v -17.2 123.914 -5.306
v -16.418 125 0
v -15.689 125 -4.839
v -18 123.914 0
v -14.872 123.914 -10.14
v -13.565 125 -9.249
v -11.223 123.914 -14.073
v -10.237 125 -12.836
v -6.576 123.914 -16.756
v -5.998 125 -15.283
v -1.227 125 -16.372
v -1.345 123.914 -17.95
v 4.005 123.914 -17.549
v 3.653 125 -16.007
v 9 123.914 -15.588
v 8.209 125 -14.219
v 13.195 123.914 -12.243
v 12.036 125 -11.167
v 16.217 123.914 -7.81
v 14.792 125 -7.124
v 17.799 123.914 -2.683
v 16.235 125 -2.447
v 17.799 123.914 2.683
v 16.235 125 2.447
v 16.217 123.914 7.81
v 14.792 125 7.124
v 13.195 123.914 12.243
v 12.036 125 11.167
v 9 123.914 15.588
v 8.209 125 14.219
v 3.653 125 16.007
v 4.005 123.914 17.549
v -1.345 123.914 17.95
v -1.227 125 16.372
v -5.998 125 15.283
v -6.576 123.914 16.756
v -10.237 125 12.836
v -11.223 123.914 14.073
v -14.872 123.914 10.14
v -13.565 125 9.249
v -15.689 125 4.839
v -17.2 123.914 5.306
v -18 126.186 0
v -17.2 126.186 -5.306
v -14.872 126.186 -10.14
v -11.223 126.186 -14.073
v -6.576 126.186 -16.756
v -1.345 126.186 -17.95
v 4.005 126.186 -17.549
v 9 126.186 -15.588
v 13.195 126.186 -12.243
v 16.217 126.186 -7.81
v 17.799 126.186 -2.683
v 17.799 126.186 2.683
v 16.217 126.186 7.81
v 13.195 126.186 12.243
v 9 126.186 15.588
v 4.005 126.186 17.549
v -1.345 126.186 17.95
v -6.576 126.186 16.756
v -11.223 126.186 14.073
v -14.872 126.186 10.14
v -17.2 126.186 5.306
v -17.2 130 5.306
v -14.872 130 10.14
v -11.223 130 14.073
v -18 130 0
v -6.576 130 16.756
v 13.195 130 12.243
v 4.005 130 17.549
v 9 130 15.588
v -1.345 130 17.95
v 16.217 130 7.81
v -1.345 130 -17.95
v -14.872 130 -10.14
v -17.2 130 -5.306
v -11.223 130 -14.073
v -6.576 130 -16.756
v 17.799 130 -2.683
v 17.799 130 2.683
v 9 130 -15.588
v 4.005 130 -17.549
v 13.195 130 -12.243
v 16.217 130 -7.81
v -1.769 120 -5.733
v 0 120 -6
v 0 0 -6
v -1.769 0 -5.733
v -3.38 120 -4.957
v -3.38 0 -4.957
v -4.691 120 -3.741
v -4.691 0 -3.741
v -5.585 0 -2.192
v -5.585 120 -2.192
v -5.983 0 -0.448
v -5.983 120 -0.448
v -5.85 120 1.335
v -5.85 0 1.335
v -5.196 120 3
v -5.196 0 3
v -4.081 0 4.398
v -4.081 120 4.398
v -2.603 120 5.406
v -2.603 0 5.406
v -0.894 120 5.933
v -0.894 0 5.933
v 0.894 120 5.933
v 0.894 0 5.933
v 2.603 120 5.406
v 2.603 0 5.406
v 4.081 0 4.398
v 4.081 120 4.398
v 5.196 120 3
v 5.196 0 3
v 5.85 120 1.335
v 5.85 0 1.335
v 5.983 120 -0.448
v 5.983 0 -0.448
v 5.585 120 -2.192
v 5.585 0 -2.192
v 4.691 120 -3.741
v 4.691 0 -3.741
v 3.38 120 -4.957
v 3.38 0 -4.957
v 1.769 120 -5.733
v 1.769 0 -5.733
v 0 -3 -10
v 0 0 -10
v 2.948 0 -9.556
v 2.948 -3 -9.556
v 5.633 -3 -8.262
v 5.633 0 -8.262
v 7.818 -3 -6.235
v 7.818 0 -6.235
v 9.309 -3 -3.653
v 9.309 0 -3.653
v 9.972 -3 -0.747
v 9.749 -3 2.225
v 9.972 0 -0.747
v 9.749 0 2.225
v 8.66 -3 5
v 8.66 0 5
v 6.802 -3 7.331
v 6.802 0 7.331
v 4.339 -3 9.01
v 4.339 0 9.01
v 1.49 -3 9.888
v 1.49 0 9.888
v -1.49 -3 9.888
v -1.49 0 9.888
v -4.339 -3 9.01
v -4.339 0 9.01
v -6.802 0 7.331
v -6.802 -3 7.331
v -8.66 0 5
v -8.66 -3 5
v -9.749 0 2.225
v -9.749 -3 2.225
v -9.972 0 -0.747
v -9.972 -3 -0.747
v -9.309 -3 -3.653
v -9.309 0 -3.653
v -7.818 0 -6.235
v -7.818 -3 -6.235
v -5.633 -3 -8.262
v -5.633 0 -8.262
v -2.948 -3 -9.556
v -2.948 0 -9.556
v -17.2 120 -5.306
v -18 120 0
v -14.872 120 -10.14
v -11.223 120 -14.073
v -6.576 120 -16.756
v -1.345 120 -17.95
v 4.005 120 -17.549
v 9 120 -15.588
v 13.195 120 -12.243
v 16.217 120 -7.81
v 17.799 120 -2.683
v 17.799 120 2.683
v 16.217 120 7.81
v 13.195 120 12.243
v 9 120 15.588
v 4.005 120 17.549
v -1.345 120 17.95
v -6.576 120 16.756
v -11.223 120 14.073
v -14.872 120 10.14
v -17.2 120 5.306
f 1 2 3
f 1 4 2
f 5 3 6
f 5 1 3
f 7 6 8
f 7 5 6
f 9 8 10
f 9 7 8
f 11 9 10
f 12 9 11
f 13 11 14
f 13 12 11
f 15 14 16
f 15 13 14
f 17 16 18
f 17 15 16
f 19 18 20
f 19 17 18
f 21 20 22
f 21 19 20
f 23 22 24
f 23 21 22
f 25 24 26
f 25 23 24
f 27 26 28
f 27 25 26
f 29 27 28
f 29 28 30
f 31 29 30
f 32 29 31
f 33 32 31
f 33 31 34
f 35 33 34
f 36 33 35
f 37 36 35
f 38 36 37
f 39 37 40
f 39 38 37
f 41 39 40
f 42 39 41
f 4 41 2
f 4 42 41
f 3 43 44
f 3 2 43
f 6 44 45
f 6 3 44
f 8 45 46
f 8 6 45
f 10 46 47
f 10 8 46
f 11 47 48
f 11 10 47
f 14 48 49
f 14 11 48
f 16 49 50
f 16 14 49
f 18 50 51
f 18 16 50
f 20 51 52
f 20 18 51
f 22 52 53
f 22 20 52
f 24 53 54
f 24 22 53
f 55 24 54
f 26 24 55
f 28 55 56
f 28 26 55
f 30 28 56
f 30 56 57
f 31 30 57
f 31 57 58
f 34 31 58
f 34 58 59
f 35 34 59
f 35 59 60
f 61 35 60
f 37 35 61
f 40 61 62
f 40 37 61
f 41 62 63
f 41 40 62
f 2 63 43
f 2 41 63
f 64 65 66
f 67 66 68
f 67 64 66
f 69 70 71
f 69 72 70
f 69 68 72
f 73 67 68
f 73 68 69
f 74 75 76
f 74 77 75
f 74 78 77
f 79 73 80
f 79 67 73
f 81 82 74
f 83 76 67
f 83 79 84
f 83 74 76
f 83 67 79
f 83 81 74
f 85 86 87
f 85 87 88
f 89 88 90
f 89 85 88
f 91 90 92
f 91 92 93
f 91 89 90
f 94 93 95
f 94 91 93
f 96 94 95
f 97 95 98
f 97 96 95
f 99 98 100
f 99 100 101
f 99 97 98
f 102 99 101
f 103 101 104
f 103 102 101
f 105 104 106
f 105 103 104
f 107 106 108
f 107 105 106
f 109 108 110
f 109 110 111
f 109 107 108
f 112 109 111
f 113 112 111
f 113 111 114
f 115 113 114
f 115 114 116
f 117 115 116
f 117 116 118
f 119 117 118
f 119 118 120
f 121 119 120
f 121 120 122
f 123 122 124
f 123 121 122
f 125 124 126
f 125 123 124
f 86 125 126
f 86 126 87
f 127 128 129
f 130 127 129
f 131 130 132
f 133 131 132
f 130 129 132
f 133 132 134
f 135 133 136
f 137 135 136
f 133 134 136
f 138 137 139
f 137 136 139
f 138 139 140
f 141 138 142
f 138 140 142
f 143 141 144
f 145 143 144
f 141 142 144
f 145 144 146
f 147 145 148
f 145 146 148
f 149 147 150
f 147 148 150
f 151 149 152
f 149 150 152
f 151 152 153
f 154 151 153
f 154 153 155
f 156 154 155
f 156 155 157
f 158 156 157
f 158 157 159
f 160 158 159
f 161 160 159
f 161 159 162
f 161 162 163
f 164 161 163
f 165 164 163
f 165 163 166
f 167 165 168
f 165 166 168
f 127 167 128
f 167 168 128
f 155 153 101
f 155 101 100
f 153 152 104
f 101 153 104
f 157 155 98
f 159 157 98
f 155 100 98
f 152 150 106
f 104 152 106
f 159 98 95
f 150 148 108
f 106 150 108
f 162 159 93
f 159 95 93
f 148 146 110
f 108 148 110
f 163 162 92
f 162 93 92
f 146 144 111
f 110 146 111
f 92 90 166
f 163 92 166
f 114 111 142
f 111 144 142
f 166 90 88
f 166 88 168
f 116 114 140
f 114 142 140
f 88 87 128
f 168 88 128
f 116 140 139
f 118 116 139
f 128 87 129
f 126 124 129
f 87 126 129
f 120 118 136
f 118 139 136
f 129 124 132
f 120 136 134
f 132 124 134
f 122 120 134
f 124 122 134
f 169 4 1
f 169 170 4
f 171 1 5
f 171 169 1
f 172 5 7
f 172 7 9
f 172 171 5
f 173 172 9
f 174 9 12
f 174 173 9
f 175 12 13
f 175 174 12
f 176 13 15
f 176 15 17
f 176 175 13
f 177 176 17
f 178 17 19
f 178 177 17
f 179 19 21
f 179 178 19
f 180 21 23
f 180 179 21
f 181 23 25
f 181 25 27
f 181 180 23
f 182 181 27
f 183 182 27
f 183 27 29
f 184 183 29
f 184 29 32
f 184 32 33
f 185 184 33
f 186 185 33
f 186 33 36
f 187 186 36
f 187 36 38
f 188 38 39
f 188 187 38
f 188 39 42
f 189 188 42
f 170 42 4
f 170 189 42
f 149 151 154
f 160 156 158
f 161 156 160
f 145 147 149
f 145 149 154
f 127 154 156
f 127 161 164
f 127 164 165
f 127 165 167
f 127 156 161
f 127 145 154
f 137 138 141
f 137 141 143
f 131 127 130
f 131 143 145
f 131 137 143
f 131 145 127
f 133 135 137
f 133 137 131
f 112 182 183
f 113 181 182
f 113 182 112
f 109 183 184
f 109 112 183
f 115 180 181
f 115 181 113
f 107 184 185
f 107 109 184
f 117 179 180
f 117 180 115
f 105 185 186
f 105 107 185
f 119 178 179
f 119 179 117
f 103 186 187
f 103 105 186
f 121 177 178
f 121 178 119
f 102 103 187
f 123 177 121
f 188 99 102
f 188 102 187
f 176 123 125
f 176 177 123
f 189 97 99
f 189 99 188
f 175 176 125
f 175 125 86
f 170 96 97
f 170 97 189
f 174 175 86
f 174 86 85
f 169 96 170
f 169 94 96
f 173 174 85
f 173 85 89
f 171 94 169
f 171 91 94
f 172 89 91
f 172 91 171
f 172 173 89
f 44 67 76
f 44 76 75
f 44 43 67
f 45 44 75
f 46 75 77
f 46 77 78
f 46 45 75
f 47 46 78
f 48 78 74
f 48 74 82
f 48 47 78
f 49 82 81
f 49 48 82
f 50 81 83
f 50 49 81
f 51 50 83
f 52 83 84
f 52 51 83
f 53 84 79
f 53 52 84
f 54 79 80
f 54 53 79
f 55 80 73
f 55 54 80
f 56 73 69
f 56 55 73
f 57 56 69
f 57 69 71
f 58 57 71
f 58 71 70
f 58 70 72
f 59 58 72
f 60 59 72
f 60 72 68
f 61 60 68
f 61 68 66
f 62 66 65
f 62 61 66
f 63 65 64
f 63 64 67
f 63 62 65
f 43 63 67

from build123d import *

# Parameters (mm, degrees)
SKETCH3_R           = 10
BOSS_EXTRUDE1_DEPTH = 3


with BuildPart() as part:
    # Sketch1 → Revolve1 (revolve)
    with BuildSketch(Plane.XY, mode=Mode.PRIVATE) as revolve1_sk:
        Polygon((0, 0), (0, 130), (6, 130), (6, 122.525384953), (6, 0), align=None)
    revolve(revolve1_sk.sketch.rotate(Axis((0, 0, 0), (0, 1, 0)), 90), axis=Axis((0, 0, 0), (0, 1, 0)))

    # Sketch2 → Revolve2 (revolve)
    with BuildSketch(Plane.XY, mode=Mode.PRIVATE) as revolve2_sk:
        Polygon((0, 130), (18, 130), (18, 126.185810056), (16.418354863, 125), (18, 123.913651393), (18, 120), (0, 120), align=None)
    revolve(revolve2_sk.sketch.rotate(Axis((0, 130, 0), (0, -1, 0)), 180), axis=Axis((0, 130, 0), (0, -1, 0)))

    # Sketch3 → Boss-Extrude1 (add)
    with BuildSketch(Plane.XZ):
        with Locations(Location((0, 0, 0), (0, 0, 270))):
            Circle(SKETCH3_R)
    extrude(amount=BOSS_EXTRUDE1_DEPTH)


solid = part.part
